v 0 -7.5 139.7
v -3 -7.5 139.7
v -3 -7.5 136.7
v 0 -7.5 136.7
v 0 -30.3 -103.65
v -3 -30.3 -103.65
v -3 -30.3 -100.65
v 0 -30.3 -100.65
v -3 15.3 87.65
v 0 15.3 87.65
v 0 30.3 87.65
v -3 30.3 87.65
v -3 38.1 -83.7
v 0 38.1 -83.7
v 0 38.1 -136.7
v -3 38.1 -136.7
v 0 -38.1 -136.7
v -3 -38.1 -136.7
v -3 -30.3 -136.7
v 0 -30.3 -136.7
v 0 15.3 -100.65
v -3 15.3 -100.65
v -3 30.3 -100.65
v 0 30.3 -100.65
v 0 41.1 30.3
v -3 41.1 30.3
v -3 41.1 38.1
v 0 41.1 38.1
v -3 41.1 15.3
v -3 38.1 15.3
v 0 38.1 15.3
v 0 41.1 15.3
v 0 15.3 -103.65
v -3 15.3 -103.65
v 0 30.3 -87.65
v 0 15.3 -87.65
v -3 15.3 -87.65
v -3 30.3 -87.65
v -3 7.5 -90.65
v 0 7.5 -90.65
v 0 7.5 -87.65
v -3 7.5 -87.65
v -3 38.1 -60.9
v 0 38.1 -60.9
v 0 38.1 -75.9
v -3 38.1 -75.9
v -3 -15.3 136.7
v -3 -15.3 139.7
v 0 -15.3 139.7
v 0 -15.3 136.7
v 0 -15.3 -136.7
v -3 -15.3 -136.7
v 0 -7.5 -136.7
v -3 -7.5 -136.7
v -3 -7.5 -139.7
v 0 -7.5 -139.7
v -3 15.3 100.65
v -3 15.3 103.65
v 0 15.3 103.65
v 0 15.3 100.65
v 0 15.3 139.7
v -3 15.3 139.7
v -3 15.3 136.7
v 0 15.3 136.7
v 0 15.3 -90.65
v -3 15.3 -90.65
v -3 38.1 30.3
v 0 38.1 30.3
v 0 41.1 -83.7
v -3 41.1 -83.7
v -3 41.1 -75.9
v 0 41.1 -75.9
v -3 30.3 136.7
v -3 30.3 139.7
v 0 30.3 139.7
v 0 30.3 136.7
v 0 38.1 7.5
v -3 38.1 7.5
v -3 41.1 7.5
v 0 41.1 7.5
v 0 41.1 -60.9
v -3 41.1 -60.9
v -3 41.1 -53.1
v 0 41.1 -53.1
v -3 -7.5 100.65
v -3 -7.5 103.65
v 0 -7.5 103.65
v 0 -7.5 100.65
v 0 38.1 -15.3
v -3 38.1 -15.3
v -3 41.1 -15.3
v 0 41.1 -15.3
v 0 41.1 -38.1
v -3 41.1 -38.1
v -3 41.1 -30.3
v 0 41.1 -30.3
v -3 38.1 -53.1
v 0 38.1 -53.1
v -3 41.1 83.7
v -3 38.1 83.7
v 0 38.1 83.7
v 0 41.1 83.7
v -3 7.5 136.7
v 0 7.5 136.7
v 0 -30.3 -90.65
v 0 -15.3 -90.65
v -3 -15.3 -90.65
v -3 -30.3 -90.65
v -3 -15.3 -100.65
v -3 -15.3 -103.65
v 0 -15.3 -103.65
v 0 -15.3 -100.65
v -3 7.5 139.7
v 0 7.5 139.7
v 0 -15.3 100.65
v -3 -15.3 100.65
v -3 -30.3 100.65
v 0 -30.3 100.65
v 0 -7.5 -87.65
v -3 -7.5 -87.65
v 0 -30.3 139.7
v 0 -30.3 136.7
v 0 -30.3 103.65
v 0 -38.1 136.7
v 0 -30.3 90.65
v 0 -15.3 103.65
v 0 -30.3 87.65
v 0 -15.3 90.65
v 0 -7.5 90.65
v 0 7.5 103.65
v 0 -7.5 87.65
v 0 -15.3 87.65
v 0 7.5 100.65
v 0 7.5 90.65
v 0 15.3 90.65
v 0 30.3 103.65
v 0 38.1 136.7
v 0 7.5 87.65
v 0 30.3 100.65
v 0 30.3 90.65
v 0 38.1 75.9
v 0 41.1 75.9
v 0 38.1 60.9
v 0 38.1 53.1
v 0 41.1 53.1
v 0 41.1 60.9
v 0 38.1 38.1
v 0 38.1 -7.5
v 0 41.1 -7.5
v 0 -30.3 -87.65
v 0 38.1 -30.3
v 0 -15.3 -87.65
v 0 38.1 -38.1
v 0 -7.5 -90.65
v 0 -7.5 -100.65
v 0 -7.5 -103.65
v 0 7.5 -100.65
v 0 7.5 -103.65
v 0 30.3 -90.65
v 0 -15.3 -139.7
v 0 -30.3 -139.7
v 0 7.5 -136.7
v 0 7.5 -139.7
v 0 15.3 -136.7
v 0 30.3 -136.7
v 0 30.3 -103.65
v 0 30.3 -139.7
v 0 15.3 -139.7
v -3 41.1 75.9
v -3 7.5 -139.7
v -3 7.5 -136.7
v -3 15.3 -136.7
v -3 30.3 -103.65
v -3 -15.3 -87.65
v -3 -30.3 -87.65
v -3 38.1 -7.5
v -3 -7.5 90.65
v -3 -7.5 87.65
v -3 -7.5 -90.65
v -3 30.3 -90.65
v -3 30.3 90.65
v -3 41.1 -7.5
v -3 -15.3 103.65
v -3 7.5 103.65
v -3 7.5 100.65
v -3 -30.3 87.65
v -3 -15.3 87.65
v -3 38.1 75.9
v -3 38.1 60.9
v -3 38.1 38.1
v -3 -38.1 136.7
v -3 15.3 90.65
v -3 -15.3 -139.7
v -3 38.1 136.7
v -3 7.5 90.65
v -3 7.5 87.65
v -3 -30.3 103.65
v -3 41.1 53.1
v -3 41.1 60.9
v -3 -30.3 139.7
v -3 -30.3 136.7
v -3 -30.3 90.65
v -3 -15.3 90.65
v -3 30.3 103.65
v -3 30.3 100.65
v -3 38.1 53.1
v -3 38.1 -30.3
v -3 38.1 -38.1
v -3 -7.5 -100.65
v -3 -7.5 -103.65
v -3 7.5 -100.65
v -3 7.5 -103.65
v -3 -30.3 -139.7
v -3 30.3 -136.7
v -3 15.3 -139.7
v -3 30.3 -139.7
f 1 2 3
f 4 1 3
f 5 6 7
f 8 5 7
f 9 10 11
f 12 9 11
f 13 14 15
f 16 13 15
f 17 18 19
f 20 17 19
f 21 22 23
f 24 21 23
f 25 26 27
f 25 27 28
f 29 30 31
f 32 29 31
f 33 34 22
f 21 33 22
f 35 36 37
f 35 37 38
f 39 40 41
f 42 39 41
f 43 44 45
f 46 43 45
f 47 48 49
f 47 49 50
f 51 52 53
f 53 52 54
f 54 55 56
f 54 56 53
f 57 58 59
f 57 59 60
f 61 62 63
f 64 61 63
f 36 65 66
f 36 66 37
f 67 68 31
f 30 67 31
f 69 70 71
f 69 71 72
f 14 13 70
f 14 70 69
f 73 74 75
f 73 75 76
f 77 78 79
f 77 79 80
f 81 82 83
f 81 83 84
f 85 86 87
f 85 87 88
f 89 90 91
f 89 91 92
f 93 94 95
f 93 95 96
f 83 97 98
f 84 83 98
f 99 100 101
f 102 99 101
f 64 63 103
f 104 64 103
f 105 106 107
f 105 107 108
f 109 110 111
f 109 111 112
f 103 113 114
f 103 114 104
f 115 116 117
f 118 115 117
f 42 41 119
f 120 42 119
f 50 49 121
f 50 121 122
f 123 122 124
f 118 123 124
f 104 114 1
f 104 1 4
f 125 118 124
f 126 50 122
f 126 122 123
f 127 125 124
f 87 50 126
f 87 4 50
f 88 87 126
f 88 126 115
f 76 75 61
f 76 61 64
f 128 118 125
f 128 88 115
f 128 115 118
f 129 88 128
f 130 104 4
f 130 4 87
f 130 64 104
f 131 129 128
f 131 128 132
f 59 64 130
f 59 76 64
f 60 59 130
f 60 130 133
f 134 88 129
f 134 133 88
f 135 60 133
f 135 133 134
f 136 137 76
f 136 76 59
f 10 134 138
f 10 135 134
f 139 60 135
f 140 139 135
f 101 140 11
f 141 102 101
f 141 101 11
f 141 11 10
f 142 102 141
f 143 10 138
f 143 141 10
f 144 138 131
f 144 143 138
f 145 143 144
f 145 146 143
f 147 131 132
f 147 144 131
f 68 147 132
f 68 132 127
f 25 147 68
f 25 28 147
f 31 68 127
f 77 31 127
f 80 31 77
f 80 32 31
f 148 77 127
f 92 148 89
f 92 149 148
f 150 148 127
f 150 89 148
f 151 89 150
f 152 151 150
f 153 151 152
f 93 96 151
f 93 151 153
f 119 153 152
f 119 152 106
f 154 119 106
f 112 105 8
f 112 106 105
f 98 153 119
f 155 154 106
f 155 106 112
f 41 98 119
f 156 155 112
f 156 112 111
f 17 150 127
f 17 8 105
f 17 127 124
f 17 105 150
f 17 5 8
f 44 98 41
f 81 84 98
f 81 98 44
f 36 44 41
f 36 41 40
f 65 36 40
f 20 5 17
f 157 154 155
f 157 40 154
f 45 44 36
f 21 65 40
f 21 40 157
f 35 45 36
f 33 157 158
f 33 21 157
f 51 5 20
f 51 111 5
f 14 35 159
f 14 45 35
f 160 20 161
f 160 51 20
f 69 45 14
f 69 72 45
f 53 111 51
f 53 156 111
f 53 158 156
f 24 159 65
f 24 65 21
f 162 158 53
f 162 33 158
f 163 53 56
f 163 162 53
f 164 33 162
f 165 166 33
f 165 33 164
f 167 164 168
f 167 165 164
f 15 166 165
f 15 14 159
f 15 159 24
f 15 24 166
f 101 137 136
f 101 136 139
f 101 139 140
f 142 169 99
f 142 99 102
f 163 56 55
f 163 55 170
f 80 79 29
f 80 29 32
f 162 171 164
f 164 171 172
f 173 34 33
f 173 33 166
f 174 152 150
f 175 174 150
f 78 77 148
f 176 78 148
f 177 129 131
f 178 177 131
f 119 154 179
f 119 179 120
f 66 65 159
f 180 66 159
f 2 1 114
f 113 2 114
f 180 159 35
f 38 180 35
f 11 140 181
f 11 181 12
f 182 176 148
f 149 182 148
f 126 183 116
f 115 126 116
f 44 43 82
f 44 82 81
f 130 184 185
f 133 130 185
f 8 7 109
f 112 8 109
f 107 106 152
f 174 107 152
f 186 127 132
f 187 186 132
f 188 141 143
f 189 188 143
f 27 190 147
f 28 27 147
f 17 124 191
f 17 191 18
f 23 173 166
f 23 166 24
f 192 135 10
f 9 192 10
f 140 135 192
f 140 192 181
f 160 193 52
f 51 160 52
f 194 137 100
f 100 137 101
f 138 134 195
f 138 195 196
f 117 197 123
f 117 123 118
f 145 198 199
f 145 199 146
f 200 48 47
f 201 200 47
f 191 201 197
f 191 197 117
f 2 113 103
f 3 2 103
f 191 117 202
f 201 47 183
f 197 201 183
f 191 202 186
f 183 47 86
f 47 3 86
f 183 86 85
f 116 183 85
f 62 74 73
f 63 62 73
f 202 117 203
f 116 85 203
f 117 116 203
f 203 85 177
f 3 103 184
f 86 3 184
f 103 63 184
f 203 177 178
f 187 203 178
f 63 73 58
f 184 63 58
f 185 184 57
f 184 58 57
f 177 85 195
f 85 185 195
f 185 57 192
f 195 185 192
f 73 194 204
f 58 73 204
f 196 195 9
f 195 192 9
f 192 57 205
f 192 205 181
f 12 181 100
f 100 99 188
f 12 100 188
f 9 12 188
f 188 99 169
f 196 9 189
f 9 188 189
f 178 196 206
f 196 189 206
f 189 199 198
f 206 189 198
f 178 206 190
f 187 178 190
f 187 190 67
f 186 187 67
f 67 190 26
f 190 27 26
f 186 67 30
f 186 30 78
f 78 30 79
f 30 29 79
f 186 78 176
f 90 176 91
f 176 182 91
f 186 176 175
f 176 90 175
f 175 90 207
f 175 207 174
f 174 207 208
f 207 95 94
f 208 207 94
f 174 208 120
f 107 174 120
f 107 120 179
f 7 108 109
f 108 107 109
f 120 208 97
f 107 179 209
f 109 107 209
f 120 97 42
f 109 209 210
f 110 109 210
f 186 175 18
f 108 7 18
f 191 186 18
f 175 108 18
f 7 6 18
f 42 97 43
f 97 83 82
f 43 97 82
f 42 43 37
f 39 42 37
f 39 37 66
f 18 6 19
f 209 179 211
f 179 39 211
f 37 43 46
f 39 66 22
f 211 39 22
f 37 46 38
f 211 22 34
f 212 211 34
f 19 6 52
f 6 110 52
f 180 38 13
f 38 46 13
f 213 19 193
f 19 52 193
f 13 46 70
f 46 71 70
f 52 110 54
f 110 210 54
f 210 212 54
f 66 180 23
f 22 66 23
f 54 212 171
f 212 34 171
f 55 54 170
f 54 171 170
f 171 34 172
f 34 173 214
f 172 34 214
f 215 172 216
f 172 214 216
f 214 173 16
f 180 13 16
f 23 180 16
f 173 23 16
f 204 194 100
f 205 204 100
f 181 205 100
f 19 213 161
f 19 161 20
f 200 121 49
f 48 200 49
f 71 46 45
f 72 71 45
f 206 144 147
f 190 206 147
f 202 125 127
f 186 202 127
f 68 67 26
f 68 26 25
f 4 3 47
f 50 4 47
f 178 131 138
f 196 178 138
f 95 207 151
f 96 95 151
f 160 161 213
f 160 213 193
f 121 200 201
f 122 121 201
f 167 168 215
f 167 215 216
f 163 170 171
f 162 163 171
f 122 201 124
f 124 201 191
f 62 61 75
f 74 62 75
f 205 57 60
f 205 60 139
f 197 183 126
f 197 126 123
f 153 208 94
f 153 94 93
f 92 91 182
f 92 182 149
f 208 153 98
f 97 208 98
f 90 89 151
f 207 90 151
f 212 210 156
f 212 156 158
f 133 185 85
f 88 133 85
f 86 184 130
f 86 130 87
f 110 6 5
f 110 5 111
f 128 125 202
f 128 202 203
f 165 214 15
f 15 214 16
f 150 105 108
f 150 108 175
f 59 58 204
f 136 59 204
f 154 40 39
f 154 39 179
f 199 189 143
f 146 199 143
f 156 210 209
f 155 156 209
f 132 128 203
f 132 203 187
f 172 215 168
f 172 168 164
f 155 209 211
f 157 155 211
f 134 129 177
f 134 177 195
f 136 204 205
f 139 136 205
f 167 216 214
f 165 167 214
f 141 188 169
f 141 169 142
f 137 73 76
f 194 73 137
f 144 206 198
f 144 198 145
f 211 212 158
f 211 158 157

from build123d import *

# Parameters (mm, degrees)
SKETCH1_W                 = 279.4
SKETCH1_H                 = 76.2
BOSS_EXTRUDE1_DEPTH       = 3
SKETCH3_W                 = 3
SKETCH3_H                 = 15
SKETCH3_H_2               = 7.8
CUT_EXTRUDE1_DEPTH        = 145.833352512
LPATTERN1_COUNT           = 4
LPATTERN1_PITCH           = 22.8
MIRROR1_COPY_1_SKETCH_W   = 3
MIRROR1_COPY_1_SKETCH_H   = 15
MIRROR1_COPY_1_SKETCH_H_2 = 7.8
MIRROR1_COPY_1_DEPTH      = 145.833352512
MIRROR1_COPY_2_SKETCH_W   = 3
MIRROR1_COPY_2_SKETCH_H   = 15
MIRROR1_COPY_2_SKETCH_H_2 = 7.8
MIRROR1_COPY_2_DEPTH      = 145.833352512
MIRROR1_COPY_3_SKETCH_W   = 3
MIRROR1_COPY_3_SKETCH_H   = 15
MIRROR1_COPY_3_SKETCH_H_2 = 7.8
MIRROR1_COPY_3_DEPTH      = 145.833352512
SKETCH4_W                 = 3
SKETCH4_H                 = 15
CUT_EXTRUDE2_DEPTH        = 10
LPATTERN2_COUNT           = 3
LPATTERN2_PITCH           = 22.8
MIRROR2_COPY_1_SKETCH_W   = 3
MIRROR2_COPY_1_SKETCH_H   = 15
MIRROR2_COPY_1_DEPTH      = 10
MIRROR2_COPY_2_SKETCH_W   = 3
MIRROR2_COPY_2_SKETCH_H   = 15
MIRROR2_COPY_2_DEPTH      = 10
SKETCH5_W                 = 3
SKETCH5_H                 = 7.8
BOSS_EXTRUDE2_DEPTH       = 3
LPATTERN3_COUNT           = 8
LPATTERN3_PITCH           = 22.8


with BuildPart() as part:
    # Sketch1 → Boss-Extrude1 (new body)
    with BuildSketch(Plane(origin=(0, 0, 0), x_dir=(0, 0, -1), z_dir=(1, 0, 0))):
        Rectangle(SKETCH1_W, SKETCH1_H)
    extrude(amount=-BOSS_EXTRUDE1_DEPTH)

    # Sketch3 → Cut-Extrude1 (cut, through all)
    with BuildSketch(Plane.ZY.offset(3)):
        with Locations((-102.15, 22.8)):
            Rectangle(SKETCH3_W, SKETCH3_H)
        with Locations((-138.2, 34.2)):
            Rectangle(SKETCH3_W, SKETCH3_H_2)
    cut_extrude1 = extrude(amount=-CUT_EXTRUDE1_DEPTH, mode=Mode.SUBTRACT)

    # LPattern1: Cut-Extrude1 ×4
    with Locations(*[(0, -i * LPATTERN1_PITCH, 0) for i in range(1, LPATTERN1_COUNT)]):
        add(cut_extrude1, mode=Mode.SUBTRACT)

    # Mirror1: Cut-Extrude1 across plane
    add(cut_extrude1.mirror(Plane.XY), mode=Mode.SUBTRACT)

    # Mirror1 copy 1 sketch → Mirror1 copy 1 (cut, through all)
    with BuildSketch(Plane(origin=(-3, -22.8, 0), x_dir=(0, 0, -1), z_dir=(-1, 0, 0))):
        with Locations((-102.15, -22.8)):
            Rectangle(MIRROR1_COPY_1_SKETCH_W, MIRROR1_COPY_1_SKETCH_H)
        with Locations((-138.2, -34.2)):
            Rectangle(MIRROR1_COPY_1_SKETCH_W, MIRROR1_COPY_1_SKETCH_H_2)
    extrude(amount=-MIRROR1_COPY_1_DEPTH, mode=Mode.SUBTRACT)

    # Mirror1 copy 2 sketch → Mirror1 copy 2 (cut, through all)
    with BuildSketch(Plane(origin=(-3, -45.6, 0), x_dir=(0, 0, -1), z_dir=(-1, 0, 0))):
        with Locations((-102.15, -22.8)):
            Rectangle(MIRROR1_COPY_2_SKETCH_W, MIRROR1_COPY_2_SKETCH_H)
        with Locations((-138.2, -34.2)):
            Rectangle(MIRROR1_COPY_2_SKETCH_W, MIRROR1_COPY_2_SKETCH_H_2)
    extrude(amount=-MIRROR1_COPY_2_DEPTH, mode=Mode.SUBTRACT)

    # Mirror1 copy 3 sketch → Mirror1 copy 3 (cut, through all)
    with BuildSketch(Plane(origin=(-3, -68.4, 0), x_dir=(0, 0, -1), z_dir=(-1, 0, 0))):
        with Locations((-102.15, -22.8)):
            Rectangle(MIRROR1_COPY_3_SKETCH_W, MIRROR1_COPY_3_SKETCH_H)
        with Locations((-138.2, -34.2)):
            Rectangle(MIRROR1_COPY_3_SKETCH_W, MIRROR1_COPY_3_SKETCH_H_2)
    extrude(amount=-MIRROR1_COPY_3_DEPTH, mode=Mode.SUBTRACT)

    # Sketch4 → Cut-Extrude2 (cut)
    with BuildSketch(Plane(origin=(0, 0, 0), x_dir=(0, 0, -1), z_dir=(1, 0, 0))):
        with Locations((-89.15, 22.8)):
            Rectangle(SKETCH4_W, SKETCH4_H)
    cut_extrude2 = extrude(amount=-CUT_EXTRUDE2_DEPTH, mode=Mode.SUBTRACT)

    # LPattern2: Cut-Extrude2 ×3
    with Locations(*[(0, -i * LPATTERN2_PITCH, 0) for i in range(1, LPATTERN2_COUNT)]):
        add(cut_extrude2, mode=Mode.SUBTRACT)

    # Mirror2: Cut-Extrude2 across plane
    add(cut_extrude2.mirror(Plane.XY), mode=Mode.SUBTRACT)

    # Mirror2 copy 1 sketch → Mirror2 copy 1 (cut)
    with BuildSketch(Plane(origin=(0, -22.8, 0), x_dir=(0, 0, 1), z_dir=(1, 0, 0))):
        with Locations((-89.15, -22.8)):
            Rectangle(MIRROR2_COPY_1_SKETCH_W, MIRROR2_COPY_1_SKETCH_H)
    extrude(amount=-MIRROR2_COPY_1_DEPTH, mode=Mode.SUBTRACT)

    # Mirror2 copy 2 sketch → Mirror2 copy 2 (cut)
    with BuildSketch(Plane(origin=(0, -45.6, 0), x_dir=(0, 0, 1), z_dir=(1, 0, 0))):
        with Locations((-89.15, -22.8)):
            Rectangle(MIRROR2_COPY_2_SKETCH_W, MIRROR2_COPY_2_SKETCH_H)
    extrude(amount=-MIRROR2_COPY_2_DEPTH, mode=Mode.SUBTRACT)

    # Sketch5 → Boss-Extrude2 (add)
    with BuildSketch(Plane(origin=(0, 38.1, 0), x_dir=(1, 0, 0), z_dir=(0, 1, 0))):
        with Locations((-1.5, -79.8)):
            Rectangle(SKETCH5_W, SKETCH5_H)
    boss_extrude2 = extrude(amount=BOSS_EXTRUDE2_DEPTH)

    # LPattern3: Boss-Extrude2 ×8
    with Locations(*[(0, 0, -i * LPATTERN3_PITCH) for i in range(1, LPATTERN3_COUNT)]):
        add(boss_extrude2)


solid = part.part
